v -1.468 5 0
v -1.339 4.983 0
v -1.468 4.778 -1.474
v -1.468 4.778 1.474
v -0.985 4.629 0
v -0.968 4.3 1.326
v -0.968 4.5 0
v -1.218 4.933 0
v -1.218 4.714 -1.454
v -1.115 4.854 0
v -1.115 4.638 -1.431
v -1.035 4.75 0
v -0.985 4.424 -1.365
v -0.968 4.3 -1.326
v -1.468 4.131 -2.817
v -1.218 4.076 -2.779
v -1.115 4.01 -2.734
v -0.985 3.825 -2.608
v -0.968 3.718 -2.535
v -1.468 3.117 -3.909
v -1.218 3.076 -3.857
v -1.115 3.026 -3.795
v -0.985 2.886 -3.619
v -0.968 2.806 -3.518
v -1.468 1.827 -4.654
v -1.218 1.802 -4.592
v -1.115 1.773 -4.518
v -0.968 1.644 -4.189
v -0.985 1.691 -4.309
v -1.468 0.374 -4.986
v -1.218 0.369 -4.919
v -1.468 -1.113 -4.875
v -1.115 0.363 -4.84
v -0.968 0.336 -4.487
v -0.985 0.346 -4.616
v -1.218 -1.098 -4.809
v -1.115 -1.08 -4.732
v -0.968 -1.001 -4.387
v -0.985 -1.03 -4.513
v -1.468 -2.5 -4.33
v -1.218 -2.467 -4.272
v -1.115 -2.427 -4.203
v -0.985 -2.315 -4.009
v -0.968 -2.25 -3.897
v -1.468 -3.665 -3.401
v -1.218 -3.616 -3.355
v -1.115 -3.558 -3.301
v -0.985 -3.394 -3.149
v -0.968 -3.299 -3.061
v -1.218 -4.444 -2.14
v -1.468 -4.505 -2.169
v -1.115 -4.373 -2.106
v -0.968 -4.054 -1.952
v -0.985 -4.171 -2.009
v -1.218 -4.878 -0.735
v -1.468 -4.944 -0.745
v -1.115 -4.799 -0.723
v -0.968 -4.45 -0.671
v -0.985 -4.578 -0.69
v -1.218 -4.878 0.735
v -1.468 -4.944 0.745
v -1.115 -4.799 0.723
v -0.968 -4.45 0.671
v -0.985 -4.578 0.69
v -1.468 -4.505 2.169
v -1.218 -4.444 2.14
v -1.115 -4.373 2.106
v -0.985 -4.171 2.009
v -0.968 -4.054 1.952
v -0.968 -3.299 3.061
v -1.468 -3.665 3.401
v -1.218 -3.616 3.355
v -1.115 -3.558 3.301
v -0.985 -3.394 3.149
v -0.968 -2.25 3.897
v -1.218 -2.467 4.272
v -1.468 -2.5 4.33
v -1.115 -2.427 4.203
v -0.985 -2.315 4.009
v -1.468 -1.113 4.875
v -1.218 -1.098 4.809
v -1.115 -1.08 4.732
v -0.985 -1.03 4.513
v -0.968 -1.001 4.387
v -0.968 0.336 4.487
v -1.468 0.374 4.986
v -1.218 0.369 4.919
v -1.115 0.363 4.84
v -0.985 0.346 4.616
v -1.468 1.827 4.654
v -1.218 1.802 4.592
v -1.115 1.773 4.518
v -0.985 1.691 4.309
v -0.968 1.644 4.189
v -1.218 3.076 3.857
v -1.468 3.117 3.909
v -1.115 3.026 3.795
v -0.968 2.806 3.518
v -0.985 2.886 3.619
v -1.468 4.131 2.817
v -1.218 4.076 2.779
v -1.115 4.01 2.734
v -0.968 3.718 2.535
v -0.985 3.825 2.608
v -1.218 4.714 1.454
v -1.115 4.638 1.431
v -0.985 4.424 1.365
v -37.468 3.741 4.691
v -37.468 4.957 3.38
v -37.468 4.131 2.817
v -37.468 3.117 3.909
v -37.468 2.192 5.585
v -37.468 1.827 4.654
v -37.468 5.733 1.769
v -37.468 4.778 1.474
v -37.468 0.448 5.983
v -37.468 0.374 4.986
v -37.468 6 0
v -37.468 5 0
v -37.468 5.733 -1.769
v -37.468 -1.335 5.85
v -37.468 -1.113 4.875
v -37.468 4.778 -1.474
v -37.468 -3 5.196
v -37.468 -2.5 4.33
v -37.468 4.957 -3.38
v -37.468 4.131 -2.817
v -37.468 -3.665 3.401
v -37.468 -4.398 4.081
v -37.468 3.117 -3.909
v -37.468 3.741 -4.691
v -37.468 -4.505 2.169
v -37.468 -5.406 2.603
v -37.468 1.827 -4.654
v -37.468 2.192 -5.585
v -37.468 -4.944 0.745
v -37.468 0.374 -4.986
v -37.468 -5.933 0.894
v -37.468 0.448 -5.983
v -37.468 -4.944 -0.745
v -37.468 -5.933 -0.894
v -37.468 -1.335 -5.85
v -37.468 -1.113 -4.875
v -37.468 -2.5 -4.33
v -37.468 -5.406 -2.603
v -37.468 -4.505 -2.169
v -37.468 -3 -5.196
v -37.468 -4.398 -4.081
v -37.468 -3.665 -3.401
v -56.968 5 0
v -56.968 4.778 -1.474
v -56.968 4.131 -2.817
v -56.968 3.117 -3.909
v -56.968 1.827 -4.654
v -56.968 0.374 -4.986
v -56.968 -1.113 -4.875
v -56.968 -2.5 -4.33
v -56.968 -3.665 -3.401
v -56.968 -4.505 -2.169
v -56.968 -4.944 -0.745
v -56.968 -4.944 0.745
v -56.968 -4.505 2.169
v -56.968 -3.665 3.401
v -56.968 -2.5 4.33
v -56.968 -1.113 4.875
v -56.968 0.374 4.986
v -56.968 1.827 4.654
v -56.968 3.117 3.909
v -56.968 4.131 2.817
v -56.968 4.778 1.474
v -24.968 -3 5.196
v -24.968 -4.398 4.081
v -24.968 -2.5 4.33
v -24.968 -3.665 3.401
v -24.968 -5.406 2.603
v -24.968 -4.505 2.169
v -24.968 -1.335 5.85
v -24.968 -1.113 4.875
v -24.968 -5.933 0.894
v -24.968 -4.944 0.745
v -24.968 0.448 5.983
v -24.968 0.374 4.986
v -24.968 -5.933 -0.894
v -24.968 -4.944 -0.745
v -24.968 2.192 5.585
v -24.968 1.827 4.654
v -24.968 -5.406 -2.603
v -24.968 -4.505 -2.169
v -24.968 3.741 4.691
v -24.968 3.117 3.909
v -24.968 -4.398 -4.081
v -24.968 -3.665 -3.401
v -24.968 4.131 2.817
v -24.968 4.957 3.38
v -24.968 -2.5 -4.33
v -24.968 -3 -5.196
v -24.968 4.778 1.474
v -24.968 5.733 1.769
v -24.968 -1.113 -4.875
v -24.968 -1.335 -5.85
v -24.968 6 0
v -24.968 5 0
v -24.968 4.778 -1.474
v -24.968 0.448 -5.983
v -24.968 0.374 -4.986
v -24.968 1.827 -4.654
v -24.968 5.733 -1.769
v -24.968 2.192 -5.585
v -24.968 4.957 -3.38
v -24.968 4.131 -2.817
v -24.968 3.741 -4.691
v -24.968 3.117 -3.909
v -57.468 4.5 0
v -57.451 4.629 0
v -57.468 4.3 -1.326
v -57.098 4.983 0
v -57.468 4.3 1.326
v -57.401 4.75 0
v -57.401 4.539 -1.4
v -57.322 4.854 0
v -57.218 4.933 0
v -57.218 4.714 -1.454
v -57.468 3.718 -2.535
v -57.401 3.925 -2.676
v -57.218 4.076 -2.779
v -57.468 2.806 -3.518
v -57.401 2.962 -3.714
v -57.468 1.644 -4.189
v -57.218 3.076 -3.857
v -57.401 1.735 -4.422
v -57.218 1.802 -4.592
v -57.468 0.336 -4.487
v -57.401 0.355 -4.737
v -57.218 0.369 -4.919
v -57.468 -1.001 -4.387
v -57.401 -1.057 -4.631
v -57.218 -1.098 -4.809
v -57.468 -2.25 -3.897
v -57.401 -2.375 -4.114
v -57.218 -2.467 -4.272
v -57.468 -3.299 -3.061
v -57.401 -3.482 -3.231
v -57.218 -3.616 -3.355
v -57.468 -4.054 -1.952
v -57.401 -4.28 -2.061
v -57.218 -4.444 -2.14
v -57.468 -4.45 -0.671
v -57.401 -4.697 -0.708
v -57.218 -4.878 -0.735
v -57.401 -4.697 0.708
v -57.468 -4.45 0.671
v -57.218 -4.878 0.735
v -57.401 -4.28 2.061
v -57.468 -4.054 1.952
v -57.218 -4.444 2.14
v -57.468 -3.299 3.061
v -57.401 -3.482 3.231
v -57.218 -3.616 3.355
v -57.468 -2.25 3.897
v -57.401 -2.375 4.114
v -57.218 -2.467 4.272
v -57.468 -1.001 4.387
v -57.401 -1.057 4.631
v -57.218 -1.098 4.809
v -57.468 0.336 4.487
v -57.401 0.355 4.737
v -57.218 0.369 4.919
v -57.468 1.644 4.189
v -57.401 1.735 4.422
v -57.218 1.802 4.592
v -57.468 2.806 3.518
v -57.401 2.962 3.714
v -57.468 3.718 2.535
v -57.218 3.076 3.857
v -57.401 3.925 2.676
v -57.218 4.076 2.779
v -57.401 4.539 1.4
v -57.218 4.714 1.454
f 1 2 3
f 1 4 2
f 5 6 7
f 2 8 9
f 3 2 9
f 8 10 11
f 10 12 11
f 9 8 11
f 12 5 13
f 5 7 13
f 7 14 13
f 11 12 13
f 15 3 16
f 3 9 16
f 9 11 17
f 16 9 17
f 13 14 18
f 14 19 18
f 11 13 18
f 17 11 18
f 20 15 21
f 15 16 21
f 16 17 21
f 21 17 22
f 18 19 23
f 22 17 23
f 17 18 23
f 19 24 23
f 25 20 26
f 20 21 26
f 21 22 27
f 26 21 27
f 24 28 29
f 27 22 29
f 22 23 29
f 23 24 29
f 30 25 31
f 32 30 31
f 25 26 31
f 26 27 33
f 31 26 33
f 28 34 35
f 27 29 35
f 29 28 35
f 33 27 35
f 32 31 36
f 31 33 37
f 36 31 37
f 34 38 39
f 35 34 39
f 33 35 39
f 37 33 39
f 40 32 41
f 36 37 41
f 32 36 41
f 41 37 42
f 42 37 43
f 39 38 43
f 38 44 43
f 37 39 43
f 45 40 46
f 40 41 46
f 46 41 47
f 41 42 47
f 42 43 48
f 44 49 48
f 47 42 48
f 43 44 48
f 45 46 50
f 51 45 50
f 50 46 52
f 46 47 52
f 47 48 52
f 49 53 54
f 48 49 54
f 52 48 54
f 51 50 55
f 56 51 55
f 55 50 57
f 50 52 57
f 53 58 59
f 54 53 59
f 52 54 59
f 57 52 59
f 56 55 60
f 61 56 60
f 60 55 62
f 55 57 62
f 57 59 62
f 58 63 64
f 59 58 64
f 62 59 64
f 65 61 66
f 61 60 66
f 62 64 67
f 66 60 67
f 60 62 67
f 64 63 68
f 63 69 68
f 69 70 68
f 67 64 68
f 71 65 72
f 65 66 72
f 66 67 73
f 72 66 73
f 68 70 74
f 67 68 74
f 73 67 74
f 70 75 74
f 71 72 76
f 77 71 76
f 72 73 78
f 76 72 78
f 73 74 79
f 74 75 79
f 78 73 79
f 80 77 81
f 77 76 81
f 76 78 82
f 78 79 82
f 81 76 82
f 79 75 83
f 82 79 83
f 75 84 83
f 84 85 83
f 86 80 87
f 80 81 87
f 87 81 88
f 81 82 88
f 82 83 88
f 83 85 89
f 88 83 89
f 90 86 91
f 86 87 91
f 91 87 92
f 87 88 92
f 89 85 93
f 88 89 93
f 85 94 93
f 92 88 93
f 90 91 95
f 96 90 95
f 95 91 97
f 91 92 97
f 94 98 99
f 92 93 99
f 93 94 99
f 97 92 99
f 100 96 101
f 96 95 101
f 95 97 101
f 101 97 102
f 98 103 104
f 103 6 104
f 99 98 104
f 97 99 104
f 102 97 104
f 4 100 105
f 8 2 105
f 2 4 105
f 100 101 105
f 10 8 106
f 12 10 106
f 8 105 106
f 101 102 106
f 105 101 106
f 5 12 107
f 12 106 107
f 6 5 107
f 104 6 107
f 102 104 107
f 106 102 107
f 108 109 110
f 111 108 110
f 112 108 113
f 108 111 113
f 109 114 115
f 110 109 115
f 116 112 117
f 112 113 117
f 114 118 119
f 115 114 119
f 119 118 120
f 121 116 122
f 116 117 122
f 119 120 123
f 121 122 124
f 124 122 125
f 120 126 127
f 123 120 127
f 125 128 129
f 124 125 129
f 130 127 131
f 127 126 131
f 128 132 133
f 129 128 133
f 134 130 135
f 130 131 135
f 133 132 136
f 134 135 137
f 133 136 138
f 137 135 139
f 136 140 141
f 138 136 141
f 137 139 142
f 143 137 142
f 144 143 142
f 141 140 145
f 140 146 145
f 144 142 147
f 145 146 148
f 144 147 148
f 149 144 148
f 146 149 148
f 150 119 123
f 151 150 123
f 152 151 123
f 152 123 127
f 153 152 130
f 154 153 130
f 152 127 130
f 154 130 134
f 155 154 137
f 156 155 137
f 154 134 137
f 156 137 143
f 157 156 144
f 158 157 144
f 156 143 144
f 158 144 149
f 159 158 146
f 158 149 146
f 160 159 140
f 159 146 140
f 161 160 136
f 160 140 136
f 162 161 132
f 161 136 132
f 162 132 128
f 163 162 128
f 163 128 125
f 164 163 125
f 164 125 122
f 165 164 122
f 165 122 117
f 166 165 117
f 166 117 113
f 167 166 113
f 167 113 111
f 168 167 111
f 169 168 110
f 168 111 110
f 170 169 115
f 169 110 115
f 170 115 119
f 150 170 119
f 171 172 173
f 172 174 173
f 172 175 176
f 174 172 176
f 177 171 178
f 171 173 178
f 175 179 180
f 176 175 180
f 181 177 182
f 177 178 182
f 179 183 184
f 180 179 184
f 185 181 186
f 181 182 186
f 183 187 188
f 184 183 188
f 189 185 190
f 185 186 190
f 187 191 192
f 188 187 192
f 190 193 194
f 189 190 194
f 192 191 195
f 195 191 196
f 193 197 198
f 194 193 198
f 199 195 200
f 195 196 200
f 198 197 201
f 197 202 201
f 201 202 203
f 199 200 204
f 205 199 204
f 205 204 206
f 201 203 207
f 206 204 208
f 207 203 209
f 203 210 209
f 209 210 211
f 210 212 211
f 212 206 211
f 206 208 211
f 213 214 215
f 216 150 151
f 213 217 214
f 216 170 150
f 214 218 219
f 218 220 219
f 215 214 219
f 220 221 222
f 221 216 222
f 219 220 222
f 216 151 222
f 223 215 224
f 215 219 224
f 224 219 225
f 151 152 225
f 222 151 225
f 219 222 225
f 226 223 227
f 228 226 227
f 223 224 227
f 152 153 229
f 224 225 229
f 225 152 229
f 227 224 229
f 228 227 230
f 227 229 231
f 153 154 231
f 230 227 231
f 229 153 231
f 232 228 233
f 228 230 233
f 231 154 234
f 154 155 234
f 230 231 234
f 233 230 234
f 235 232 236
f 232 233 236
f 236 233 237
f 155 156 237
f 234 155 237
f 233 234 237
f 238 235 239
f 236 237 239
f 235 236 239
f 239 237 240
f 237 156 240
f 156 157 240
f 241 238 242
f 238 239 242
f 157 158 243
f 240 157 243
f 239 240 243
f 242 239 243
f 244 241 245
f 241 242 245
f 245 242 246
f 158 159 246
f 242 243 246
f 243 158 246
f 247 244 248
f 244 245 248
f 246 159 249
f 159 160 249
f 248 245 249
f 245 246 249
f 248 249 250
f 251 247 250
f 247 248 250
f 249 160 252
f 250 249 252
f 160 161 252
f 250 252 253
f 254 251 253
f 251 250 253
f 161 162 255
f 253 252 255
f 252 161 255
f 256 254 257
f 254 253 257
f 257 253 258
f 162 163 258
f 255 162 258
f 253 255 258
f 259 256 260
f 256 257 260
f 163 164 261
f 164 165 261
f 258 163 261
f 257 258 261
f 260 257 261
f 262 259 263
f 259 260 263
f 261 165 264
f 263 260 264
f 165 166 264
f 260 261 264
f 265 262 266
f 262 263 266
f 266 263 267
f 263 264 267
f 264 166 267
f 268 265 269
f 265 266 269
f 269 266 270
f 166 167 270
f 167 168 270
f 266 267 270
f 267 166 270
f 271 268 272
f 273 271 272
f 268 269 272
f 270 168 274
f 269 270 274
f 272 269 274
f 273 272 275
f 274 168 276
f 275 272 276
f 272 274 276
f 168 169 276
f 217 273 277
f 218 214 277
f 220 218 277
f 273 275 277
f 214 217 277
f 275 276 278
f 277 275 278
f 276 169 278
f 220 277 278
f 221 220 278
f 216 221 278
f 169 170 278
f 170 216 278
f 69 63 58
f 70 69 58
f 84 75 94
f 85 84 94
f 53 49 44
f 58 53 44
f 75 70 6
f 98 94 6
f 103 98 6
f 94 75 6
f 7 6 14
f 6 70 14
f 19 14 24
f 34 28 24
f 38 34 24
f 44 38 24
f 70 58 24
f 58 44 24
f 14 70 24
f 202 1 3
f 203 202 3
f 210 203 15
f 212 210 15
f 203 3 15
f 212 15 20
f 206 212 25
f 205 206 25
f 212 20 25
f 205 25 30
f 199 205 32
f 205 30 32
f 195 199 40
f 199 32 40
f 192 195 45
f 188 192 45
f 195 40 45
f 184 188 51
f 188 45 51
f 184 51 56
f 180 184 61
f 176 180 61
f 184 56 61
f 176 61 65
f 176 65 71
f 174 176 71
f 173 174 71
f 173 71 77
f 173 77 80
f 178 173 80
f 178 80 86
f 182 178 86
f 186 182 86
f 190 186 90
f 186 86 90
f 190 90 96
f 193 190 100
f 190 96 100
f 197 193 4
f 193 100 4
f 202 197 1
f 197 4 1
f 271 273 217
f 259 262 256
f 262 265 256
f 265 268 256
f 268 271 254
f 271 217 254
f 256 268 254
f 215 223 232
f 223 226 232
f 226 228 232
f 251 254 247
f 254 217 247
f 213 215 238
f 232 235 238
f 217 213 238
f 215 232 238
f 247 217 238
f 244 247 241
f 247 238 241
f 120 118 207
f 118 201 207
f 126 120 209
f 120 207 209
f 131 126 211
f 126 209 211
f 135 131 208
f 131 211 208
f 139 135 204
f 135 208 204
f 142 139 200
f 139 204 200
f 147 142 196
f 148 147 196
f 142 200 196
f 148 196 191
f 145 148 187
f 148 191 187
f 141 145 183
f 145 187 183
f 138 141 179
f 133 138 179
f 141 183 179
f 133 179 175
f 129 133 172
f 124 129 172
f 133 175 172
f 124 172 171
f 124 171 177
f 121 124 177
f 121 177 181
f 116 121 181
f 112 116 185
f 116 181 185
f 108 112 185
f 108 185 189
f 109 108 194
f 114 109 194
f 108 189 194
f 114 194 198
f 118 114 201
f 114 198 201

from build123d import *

# Parameters (mm, degrees)
VERRUNDUNG1_R = 0.5


with BuildPart() as part:
    # Skizze1 → Rotation1 (revolve)
    with BuildSketch(Plane.XY):
        Polygon((-57.468382115, 0), (-57.468382115, 5), (-37.468382115, 5), (-37.468382115, 6), (-24.968382115, 6), (-24.968382115, 5), (-0.968382115, 5), (-0.968382115, 0), align=None)
    revolve(axis=Axis((-0.968382115, 0, 0), (-1, 0, 0)))

    # Verrundung1
    verrundung1_edges = [part.edges().sort_by_distance(p)[0] for p in [
        (-0.968382115, -5, 0),
        (-57.468382115, -5, 0),
    ]]
    fillet(verrundung1_edges, radius=VERRUNDUNG1_R)


solid = part.part
